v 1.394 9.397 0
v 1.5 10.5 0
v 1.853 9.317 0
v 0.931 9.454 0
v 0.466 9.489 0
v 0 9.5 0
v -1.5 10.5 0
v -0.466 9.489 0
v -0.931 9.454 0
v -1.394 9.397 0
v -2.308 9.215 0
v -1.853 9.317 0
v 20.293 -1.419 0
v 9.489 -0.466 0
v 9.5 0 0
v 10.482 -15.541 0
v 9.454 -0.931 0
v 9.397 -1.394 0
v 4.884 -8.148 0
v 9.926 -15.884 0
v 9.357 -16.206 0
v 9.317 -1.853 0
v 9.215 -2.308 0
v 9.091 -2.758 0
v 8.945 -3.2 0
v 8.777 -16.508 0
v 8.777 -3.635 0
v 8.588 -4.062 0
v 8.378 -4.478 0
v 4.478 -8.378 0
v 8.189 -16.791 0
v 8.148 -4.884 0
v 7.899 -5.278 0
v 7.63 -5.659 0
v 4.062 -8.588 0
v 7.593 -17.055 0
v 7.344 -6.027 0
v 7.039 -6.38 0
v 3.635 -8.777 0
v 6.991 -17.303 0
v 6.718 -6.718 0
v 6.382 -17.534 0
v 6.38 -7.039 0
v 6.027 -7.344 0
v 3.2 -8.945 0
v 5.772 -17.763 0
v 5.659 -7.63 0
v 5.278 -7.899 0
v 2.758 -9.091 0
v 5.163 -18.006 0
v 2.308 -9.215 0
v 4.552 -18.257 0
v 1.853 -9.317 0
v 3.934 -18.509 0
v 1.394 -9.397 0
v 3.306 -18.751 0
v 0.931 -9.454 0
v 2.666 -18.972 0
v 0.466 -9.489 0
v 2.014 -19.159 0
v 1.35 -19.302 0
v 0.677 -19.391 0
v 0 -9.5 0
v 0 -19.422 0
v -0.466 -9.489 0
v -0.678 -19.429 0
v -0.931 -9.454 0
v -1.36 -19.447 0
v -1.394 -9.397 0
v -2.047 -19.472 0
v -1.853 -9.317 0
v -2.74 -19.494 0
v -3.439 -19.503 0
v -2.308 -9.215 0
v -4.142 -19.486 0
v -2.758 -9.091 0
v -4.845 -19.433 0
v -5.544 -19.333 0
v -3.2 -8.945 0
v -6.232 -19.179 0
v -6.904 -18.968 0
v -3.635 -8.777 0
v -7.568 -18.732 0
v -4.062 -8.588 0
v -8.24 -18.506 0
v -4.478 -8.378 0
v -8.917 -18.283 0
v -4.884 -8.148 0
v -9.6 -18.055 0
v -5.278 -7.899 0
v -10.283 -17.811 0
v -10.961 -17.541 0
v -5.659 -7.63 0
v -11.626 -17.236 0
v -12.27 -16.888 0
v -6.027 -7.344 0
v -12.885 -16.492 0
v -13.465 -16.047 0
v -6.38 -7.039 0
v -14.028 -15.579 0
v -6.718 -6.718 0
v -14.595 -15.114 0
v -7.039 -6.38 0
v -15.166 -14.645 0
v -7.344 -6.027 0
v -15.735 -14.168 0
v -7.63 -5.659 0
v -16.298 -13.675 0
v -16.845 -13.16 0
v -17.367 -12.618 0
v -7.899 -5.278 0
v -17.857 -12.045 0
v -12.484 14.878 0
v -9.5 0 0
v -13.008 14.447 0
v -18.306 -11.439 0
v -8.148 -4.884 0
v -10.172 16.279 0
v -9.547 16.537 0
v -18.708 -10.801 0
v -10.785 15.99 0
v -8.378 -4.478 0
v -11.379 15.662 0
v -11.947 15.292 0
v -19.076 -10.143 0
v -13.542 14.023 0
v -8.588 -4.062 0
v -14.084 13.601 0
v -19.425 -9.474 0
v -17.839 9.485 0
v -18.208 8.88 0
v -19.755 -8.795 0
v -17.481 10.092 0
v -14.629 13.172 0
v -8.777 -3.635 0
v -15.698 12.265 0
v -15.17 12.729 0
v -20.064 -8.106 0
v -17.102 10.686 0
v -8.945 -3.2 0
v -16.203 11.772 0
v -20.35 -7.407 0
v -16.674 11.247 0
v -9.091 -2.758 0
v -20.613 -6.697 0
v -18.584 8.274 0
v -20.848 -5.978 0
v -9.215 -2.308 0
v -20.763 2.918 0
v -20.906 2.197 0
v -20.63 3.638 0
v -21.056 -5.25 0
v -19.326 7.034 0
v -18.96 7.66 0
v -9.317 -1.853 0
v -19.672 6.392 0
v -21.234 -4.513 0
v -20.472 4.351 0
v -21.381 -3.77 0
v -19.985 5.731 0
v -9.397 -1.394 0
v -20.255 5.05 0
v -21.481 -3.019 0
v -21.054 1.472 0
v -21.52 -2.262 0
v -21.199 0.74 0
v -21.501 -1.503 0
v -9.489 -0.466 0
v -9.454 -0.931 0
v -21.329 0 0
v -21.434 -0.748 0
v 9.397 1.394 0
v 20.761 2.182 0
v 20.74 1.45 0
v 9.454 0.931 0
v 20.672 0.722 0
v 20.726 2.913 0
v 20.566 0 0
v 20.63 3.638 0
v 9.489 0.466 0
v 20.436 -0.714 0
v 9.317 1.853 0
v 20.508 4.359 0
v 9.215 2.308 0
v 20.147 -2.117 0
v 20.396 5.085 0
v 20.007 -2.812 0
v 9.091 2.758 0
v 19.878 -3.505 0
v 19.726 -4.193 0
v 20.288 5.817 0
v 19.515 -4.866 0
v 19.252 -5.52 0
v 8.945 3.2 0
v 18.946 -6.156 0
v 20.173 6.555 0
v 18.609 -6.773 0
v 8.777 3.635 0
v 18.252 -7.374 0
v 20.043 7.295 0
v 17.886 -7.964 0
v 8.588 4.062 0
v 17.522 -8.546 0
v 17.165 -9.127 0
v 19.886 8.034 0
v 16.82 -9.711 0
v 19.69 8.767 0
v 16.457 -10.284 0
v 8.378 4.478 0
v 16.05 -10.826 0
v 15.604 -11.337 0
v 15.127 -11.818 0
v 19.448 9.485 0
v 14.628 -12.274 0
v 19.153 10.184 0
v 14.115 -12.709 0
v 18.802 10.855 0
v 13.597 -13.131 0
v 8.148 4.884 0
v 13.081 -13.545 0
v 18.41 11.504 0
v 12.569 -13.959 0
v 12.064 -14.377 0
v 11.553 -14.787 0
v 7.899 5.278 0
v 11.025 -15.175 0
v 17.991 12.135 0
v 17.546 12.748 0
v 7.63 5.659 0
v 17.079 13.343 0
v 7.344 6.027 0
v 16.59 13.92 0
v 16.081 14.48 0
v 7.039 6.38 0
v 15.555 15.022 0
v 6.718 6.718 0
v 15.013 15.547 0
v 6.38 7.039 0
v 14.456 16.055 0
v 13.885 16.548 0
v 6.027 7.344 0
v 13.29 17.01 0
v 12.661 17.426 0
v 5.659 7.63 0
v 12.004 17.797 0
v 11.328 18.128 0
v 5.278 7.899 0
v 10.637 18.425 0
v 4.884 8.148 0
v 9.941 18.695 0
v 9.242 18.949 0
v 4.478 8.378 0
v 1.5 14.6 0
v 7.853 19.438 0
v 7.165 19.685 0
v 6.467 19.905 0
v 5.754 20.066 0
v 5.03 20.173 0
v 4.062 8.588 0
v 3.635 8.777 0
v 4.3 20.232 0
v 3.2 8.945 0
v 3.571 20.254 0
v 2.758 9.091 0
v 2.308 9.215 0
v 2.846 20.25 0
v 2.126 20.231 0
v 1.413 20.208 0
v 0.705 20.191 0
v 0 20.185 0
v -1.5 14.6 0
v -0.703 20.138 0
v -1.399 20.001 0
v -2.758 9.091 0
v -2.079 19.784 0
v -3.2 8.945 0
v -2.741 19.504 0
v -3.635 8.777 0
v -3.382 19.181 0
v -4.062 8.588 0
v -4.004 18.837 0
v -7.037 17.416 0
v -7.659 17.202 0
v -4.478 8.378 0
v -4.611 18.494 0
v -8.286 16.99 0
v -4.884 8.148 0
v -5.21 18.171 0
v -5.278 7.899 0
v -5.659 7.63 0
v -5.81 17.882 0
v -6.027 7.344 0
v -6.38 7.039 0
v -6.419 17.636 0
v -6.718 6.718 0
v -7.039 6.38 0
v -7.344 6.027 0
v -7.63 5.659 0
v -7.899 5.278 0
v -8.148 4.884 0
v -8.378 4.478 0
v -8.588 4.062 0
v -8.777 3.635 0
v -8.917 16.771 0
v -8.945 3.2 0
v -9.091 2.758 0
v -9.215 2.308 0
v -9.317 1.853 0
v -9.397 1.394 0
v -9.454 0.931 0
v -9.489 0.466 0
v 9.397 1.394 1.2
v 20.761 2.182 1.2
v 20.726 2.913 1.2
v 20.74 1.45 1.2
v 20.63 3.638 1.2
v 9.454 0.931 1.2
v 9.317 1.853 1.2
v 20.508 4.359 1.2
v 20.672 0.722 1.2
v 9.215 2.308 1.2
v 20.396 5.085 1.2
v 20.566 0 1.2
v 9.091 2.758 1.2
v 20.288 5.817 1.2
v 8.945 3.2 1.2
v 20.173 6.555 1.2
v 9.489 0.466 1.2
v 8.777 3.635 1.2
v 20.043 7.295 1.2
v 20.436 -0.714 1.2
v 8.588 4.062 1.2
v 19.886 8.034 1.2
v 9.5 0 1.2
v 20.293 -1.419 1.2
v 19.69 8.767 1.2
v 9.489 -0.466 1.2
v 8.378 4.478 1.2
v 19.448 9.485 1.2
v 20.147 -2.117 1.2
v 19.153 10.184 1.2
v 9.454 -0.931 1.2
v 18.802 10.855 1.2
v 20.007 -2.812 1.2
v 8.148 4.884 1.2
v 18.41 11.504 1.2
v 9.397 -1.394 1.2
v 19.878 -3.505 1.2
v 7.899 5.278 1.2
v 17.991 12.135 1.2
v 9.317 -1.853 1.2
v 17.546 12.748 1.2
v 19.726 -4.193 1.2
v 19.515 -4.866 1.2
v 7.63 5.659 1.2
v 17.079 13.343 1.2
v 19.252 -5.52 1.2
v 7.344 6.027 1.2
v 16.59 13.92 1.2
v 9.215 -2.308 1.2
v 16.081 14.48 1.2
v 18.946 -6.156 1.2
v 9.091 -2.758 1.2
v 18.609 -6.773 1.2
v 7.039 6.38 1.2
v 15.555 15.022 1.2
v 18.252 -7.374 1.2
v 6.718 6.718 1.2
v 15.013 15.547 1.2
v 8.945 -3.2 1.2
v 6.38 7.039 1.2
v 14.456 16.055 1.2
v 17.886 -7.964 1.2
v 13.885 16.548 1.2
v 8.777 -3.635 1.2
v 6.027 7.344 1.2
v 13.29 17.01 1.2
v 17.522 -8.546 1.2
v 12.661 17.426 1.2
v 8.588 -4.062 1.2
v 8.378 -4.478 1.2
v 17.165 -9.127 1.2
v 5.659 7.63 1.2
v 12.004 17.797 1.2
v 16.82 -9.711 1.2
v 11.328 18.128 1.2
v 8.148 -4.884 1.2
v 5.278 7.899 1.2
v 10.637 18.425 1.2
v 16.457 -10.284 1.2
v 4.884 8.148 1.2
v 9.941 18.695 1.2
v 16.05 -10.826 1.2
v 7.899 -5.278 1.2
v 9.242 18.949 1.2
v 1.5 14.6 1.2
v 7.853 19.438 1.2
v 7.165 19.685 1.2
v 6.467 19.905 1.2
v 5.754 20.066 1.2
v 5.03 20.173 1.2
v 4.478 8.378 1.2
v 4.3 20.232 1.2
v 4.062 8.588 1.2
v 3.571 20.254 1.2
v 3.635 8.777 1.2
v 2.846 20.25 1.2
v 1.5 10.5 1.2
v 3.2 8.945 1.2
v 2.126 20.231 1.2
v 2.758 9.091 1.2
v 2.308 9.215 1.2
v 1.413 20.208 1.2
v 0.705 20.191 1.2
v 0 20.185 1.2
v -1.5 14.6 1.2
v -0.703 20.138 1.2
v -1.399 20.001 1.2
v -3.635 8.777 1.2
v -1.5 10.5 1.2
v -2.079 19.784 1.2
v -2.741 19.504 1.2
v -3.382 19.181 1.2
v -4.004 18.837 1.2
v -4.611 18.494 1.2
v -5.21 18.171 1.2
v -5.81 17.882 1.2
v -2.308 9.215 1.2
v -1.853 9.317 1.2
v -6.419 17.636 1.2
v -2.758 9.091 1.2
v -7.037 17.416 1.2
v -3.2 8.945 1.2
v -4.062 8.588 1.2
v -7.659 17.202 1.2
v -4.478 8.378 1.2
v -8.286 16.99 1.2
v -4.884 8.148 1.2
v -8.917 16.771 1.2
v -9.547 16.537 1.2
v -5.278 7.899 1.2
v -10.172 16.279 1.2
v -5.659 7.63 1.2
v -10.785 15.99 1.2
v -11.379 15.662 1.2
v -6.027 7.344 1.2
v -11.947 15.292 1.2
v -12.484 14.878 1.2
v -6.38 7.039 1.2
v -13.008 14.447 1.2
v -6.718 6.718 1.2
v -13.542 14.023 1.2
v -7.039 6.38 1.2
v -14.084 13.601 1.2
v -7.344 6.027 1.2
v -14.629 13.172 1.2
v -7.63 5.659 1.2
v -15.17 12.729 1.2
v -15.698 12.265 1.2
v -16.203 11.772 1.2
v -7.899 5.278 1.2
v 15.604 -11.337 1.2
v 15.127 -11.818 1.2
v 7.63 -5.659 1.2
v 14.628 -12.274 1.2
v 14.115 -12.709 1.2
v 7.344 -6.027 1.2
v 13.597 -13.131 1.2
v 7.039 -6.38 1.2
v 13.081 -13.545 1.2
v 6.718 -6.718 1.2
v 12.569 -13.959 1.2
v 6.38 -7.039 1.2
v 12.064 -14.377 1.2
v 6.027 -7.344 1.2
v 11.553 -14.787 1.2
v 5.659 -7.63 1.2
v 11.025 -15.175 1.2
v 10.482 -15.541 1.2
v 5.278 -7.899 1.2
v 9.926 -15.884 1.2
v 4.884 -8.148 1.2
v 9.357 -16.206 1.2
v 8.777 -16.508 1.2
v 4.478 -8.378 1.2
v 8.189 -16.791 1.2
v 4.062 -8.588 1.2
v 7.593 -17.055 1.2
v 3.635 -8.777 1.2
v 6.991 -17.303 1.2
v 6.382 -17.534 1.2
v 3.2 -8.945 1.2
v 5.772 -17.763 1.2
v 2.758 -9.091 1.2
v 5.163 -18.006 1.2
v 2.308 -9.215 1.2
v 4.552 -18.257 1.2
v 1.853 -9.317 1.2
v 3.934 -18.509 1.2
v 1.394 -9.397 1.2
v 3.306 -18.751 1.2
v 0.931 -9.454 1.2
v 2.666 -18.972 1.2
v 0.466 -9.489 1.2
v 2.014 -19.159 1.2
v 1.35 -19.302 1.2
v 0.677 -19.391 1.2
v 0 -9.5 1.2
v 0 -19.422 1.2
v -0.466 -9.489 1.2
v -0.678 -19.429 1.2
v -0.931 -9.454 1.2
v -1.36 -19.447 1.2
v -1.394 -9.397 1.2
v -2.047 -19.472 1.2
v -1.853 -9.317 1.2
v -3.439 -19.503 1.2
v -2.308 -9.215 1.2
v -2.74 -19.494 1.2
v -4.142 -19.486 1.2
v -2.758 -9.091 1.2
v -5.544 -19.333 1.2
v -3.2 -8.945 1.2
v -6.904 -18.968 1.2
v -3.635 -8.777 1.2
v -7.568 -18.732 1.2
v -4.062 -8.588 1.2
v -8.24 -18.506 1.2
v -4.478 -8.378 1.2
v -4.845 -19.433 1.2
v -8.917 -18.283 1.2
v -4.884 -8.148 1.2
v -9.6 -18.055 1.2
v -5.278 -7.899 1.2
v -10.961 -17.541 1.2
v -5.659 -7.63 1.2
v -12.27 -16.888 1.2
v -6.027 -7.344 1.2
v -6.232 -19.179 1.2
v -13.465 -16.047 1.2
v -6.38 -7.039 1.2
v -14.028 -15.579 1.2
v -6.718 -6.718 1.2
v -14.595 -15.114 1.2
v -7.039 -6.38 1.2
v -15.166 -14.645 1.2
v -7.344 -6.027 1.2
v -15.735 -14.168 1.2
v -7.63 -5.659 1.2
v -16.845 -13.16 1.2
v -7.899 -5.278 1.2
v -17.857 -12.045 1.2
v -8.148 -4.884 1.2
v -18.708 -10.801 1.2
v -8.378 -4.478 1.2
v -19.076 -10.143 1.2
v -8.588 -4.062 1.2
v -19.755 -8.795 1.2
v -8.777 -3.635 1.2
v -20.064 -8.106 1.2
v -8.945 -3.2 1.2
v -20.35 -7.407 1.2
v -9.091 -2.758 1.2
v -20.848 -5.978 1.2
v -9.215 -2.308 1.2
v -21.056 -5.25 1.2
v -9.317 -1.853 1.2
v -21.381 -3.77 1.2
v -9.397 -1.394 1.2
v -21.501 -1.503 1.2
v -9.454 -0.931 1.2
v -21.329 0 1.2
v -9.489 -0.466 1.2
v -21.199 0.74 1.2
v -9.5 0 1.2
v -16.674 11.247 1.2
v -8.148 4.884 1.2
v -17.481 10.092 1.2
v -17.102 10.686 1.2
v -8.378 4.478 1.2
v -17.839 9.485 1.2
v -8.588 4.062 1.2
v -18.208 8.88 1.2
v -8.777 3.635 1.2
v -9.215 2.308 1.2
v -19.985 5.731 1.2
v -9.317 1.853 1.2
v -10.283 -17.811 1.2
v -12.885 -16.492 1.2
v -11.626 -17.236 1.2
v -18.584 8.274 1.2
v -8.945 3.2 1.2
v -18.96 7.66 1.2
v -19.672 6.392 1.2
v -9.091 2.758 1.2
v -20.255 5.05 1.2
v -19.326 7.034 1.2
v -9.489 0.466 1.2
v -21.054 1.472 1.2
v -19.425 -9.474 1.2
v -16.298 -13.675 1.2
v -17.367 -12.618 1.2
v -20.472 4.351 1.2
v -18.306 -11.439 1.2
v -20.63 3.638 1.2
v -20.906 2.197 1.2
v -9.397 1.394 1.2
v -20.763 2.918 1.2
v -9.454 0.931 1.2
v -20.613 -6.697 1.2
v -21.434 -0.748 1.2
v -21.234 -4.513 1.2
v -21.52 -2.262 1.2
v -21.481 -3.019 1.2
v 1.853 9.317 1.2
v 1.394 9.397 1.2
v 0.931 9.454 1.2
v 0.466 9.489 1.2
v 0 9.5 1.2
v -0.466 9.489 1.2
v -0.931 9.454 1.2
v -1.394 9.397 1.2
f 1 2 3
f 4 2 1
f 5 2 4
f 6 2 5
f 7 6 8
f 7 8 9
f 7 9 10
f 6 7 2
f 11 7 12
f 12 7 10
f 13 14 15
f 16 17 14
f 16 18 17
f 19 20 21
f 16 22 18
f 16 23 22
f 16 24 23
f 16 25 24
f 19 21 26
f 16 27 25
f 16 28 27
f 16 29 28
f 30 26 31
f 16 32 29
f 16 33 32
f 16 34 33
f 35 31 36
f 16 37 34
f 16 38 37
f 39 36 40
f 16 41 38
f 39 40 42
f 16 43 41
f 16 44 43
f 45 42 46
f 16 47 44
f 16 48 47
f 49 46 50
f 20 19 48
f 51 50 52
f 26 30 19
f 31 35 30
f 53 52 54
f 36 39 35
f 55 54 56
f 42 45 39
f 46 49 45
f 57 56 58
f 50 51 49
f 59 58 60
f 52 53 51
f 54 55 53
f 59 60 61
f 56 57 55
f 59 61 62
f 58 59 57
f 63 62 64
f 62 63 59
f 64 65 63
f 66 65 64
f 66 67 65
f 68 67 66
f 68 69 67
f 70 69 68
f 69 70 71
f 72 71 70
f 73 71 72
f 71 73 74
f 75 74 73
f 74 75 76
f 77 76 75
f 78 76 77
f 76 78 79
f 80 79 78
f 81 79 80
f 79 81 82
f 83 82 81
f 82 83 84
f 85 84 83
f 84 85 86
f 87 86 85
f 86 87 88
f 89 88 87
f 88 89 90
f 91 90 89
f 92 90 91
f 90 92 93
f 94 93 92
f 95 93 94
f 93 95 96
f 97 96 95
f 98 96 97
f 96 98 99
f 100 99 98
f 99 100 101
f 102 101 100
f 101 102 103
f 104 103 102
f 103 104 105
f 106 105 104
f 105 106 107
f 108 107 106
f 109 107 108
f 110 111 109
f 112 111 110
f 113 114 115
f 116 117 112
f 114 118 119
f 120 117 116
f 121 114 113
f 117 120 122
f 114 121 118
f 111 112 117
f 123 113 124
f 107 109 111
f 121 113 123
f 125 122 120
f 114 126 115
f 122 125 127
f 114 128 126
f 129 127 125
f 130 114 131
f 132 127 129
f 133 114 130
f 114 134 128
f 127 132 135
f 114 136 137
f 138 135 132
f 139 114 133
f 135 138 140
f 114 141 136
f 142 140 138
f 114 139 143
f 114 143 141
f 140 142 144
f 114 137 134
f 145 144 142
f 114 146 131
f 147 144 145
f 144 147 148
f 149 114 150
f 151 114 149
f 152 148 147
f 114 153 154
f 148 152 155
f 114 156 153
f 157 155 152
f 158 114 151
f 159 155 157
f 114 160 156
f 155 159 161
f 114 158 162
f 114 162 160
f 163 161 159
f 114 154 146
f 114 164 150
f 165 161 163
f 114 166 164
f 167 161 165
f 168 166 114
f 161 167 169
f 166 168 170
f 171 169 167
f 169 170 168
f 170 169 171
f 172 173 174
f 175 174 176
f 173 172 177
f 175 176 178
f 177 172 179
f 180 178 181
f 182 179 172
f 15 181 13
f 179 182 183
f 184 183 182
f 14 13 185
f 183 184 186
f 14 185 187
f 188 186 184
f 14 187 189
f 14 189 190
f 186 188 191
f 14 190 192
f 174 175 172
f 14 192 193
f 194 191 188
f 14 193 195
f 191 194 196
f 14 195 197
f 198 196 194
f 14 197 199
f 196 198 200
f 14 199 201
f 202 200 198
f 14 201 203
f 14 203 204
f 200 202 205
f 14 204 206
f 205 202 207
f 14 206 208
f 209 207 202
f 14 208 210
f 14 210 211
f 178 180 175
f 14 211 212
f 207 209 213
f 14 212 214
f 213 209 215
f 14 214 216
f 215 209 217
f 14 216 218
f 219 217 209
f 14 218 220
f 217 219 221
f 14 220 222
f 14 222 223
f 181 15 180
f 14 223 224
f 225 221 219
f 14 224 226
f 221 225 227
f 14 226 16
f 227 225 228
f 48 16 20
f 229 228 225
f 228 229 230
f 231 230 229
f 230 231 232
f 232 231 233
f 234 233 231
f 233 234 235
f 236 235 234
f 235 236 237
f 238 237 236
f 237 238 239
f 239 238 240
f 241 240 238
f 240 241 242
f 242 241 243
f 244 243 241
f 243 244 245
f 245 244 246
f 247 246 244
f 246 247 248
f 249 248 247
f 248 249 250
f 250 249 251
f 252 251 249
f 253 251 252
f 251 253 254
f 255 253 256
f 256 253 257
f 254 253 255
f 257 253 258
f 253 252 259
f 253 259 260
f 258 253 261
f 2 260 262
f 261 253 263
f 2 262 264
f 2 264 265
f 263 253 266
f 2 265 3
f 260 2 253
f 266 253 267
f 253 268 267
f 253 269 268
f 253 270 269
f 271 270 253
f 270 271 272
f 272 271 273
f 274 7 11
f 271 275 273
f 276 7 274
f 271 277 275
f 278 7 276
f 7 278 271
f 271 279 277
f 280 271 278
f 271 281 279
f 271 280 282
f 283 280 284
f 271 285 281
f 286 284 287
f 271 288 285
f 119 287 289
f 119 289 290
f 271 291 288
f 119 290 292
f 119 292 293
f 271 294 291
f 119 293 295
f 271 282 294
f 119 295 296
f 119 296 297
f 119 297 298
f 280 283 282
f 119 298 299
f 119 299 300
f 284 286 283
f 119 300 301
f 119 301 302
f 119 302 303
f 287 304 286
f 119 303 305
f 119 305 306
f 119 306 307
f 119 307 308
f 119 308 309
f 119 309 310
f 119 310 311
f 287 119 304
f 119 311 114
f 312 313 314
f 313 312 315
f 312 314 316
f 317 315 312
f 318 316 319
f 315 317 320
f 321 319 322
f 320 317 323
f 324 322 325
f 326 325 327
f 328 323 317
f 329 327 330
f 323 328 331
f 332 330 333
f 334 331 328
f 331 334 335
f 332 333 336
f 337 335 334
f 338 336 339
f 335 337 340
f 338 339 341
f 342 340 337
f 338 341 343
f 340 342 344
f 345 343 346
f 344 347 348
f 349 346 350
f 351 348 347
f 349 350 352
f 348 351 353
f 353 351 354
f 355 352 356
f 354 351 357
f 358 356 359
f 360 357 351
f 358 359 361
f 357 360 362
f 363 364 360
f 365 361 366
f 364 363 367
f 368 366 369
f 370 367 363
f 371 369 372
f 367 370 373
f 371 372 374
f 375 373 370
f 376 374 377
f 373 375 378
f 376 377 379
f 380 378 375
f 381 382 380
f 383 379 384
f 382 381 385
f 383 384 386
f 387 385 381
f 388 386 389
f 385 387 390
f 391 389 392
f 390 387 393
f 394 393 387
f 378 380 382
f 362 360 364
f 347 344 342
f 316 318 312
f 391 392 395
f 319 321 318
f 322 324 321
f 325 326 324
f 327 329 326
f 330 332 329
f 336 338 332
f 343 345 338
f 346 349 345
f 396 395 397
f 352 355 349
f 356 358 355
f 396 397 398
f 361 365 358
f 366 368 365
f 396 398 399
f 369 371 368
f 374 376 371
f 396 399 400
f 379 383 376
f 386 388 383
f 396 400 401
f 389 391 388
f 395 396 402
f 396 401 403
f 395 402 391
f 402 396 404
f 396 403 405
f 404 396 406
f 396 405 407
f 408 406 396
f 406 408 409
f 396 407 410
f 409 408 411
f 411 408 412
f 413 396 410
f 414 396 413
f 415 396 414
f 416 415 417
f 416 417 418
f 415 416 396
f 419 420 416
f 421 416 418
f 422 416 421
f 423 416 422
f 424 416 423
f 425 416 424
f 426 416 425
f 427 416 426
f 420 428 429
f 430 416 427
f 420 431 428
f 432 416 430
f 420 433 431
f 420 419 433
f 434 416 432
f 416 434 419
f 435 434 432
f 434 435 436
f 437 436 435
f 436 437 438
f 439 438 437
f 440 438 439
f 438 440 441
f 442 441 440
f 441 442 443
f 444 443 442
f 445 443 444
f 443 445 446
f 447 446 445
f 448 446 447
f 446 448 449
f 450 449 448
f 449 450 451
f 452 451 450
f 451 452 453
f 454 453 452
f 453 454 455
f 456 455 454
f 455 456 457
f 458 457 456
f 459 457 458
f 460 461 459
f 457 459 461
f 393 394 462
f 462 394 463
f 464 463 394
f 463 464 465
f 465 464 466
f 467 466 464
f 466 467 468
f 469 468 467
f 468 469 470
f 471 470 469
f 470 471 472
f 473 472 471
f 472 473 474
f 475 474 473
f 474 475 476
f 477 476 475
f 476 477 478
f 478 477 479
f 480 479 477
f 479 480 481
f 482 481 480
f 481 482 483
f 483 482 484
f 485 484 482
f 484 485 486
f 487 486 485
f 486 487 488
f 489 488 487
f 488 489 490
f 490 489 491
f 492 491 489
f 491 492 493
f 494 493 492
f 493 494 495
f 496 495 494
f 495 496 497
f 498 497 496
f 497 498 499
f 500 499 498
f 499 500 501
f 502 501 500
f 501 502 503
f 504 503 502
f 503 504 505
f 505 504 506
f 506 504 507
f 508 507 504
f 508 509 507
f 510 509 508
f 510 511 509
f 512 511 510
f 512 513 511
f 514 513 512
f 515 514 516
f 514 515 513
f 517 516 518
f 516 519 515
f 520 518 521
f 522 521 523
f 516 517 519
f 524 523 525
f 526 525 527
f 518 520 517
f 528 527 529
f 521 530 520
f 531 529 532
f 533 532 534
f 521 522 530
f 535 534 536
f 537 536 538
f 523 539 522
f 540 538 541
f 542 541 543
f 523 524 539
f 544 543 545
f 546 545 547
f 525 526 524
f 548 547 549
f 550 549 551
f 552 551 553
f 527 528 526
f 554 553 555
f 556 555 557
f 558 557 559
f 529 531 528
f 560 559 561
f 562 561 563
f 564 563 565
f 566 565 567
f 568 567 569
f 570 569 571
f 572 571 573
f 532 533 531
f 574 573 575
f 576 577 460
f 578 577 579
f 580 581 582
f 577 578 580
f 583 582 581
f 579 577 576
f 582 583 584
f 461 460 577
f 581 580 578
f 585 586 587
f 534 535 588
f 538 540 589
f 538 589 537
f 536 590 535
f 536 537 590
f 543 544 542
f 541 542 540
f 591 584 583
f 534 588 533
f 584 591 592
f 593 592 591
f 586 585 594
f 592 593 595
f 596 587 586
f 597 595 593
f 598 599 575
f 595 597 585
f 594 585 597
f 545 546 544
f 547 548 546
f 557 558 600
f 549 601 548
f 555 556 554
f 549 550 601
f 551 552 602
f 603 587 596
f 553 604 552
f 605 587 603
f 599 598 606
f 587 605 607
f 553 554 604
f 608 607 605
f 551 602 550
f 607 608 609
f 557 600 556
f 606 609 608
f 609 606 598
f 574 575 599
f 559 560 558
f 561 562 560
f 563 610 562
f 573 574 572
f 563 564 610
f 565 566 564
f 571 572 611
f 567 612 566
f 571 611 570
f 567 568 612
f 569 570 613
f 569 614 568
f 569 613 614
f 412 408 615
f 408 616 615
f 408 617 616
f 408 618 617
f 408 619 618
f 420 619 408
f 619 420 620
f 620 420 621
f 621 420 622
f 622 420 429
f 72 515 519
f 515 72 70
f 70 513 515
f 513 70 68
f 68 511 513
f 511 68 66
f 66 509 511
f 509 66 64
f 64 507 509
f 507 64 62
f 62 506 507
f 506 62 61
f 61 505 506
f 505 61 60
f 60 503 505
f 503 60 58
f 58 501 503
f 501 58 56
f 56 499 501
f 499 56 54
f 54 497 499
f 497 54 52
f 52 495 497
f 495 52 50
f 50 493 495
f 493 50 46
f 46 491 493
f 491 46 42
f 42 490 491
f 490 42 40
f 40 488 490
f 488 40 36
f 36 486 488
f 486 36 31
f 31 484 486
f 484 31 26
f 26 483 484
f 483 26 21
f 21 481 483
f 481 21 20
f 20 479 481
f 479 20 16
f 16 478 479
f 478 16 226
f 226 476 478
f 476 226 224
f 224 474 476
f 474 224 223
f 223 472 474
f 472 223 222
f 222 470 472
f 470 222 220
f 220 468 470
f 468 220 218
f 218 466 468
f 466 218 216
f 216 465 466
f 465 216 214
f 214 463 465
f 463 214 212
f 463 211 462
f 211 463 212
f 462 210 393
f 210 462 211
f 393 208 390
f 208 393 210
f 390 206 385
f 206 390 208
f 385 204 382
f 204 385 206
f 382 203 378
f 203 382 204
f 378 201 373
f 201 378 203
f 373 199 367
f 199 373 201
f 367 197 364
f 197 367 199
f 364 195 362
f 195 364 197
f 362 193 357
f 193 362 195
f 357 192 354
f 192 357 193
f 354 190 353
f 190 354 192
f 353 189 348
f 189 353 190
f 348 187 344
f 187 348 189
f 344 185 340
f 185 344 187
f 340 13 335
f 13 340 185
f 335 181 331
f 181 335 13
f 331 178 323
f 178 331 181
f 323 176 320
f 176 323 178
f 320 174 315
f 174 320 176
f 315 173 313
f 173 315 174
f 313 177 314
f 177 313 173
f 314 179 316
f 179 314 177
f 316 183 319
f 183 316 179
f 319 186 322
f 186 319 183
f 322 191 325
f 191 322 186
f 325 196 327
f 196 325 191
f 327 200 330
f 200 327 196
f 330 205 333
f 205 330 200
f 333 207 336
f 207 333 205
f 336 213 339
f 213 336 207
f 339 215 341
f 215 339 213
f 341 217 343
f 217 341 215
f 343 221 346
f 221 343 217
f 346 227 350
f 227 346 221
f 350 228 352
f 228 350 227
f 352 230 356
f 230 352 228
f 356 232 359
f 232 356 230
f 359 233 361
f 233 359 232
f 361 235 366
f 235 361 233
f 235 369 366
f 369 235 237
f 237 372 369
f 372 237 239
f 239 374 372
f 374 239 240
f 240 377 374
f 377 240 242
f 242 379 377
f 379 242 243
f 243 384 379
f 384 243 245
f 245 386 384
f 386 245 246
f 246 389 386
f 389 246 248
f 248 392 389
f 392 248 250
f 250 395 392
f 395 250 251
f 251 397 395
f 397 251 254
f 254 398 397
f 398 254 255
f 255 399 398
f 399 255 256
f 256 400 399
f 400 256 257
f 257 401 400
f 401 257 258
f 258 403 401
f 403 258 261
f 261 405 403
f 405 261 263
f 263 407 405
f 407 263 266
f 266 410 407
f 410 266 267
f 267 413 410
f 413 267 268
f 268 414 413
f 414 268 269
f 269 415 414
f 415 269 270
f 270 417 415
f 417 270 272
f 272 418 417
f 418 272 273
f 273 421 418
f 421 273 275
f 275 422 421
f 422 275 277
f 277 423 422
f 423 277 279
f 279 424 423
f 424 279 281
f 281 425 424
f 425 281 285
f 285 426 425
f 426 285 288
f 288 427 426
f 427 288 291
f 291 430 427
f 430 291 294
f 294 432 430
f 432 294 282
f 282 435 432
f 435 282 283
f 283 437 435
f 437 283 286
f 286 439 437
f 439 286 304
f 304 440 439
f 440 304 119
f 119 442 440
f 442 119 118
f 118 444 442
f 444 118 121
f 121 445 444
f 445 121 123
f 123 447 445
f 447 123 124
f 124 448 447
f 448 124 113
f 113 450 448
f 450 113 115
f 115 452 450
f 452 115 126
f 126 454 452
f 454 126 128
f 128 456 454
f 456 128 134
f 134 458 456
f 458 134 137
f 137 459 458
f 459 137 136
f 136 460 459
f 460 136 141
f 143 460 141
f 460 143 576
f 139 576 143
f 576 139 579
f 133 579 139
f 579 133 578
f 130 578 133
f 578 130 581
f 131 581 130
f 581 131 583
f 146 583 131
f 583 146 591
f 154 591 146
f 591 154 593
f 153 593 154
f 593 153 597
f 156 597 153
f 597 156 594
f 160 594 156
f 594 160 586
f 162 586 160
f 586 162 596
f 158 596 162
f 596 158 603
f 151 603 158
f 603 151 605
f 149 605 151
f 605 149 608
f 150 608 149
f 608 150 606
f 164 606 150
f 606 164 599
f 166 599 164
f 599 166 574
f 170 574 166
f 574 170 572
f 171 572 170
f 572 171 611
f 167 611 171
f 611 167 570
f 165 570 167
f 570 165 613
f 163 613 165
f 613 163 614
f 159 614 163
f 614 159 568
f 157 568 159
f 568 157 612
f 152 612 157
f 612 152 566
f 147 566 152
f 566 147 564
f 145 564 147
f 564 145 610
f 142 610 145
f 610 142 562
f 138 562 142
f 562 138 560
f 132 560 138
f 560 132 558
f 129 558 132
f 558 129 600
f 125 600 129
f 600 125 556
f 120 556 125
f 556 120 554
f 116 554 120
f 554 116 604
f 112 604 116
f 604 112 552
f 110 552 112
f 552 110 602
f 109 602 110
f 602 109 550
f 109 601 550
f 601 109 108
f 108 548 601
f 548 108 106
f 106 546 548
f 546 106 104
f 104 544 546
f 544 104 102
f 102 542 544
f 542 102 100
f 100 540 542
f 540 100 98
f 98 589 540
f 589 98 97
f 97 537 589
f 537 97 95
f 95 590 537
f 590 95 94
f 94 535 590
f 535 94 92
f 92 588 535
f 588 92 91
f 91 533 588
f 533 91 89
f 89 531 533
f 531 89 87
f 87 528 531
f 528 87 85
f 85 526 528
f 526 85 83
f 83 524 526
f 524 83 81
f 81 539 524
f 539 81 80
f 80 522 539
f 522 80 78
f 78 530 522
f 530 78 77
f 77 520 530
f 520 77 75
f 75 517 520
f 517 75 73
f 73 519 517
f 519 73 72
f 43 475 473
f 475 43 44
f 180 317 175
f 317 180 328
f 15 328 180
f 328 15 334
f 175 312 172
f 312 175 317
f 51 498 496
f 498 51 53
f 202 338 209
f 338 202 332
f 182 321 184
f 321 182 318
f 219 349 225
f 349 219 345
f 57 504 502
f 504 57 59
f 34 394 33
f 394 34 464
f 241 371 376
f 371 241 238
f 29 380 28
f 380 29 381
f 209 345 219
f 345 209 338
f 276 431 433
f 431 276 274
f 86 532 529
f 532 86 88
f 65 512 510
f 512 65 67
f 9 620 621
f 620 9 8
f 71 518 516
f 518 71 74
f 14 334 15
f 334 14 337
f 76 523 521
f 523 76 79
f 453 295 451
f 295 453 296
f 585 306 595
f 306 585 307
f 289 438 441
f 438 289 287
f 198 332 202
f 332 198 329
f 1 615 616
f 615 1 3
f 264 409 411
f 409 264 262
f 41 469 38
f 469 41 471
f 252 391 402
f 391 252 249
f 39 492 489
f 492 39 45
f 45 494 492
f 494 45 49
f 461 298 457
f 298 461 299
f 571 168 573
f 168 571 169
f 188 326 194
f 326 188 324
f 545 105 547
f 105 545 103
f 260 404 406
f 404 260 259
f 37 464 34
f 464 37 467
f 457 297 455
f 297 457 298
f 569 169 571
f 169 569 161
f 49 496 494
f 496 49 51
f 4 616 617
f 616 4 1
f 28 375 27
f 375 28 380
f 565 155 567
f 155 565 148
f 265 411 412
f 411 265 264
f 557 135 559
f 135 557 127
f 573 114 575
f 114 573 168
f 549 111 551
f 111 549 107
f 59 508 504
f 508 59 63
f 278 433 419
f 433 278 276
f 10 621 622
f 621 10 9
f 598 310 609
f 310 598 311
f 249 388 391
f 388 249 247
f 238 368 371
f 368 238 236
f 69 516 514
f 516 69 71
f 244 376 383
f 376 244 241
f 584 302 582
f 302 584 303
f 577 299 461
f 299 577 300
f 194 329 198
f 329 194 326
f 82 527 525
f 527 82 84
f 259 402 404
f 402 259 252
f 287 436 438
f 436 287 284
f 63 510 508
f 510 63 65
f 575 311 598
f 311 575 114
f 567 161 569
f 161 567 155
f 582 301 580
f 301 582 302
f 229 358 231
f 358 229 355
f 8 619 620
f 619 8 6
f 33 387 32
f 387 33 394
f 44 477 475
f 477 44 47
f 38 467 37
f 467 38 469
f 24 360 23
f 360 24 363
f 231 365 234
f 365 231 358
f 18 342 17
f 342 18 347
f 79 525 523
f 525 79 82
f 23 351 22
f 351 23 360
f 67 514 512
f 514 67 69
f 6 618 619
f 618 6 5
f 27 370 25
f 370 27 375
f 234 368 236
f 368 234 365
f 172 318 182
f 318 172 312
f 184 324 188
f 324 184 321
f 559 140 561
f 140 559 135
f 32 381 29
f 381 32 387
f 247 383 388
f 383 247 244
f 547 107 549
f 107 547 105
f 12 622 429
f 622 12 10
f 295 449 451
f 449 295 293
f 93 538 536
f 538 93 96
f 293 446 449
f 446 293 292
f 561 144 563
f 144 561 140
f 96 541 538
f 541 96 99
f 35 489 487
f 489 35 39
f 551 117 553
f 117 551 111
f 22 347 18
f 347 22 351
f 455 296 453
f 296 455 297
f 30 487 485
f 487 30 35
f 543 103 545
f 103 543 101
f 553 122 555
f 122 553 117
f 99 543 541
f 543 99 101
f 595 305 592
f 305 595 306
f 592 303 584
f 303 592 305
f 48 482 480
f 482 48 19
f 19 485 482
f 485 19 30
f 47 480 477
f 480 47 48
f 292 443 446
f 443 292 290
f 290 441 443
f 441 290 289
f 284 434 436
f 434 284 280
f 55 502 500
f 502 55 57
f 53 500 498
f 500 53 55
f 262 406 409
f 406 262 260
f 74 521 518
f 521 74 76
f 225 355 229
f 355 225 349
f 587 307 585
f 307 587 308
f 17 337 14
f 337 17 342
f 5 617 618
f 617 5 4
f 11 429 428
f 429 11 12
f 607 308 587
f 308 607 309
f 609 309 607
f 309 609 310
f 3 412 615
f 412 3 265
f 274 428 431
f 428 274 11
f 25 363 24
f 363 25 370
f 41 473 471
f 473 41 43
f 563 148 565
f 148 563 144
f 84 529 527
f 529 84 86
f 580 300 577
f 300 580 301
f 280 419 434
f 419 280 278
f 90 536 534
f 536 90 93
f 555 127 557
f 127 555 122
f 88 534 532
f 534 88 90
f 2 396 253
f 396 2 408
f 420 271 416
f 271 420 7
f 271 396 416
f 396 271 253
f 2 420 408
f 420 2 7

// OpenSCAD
/*
  Elna Supermatic cam 02
  Name: Serpentine
  Status: candidate

  Generated from measured parametric base v2.
  Surface mode: smooth
*/

include <_elna_measured_common.scad>;

profile_points = [
        [0.0000, 20.1850],
        [0.7051, 20.1914],
        [1.4131, 20.2085],
        [2.1263, 20.2308],
        [2.8459, 20.2496],
        [3.5713, 20.2540],
        [4.3005, 20.2324],
        [5.0297, 20.1732],
        [5.7540, 20.0665],
        [6.4675, 19.9050],
        [7.1646, 19.6847],
        [7.8533, 19.4375],
        [8.5457, 19.1940],
        [9.2421, 18.9491],
        [9.9406, 18.6955],
        [10.6375, 18.4247],
        [11.3276, 18.1279],
        [12.0043, 17.7971],
        [12.6606, 17.4259],
        [13.2897, 17.0100],
        [13.8855, 16.5481],
        [14.4563, 16.0554],
        [15.0132, 15.5467],
        [15.5553, 15.0216],
        [16.0814, 14.4798],
        [16.5898, 13.9205],
        [17.0788, 13.3434],
        [17.5464, 12.7482],
        [17.9906, 12.1348],
        [18.4097, 11.5037],
        [18.8023, 10.8555],
        [19.1532, 10.1839],
        [19.4482, 9.4855],
        [19.6903, 8.7667],
        [19.8857, 8.0343],
        [20.0432, 7.2951],
        [20.1734, 6.5547],
        [20.2877, 5.8174],
        [20.3965, 5.0854],
        [20.5085, 4.3592],
        [20.6298, 3.6376],
        [20.7256, 2.9128],
        [20.7608, 2.1820],
        [20.7401, 1.4503],
        [20.6718, 0.7219],
        [20.5665, 0.0000],
        [20.4362, -0.7136],
        [20.2927, -1.4190],
        [20.1469, -2.1175],
        [20.0071, -2.8118],
        [19.8783, -3.5051],
        [19.7256, -4.1928],
        [19.5147, -4.8656],
        [19.2519, -5.5204],
        [18.9464, -6.1560],
        [18.6092, -6.7732],
        [18.2522, -7.3744],
        [17.8865, -7.9636],
        [17.5219, -8.5460],
        [17.1651, -9.1268],
        [16.8199, -9.7110],
        [16.4572, -10.2836],
        [16.0498, -10.8257],
        [15.6037, -11.3367],
        [15.1267, -11.8183],
        [14.6276, -12.2740],
        [14.1153, -12.7094],
        [13.5975, -13.1310],
        [13.0807, -13.5455],
        [12.5690, -13.9592],
        [12.0638, -14.3771],
        [11.5531, -14.7873],
        [11.0254, -15.1752],
        [10.4824, -15.5408],
        [9.9256, -15.8842],
        [9.3567, -16.2064],
        [8.7775, -16.5082],
        [8.1894, -16.7908],
        [7.5935, -17.0554],
        [6.9908, -17.3028],
        [6.3818, -17.5337],
        [5.7717, -17.7635],
        [5.1632, -18.0062],
        [4.5521, -18.2573],
        [3.9342, -18.5091],
        [3.3063, -18.7512],
        [2.6663, -18.9719],
        [2.0137, -19.1592],
        [1.3497, -19.3020],
        [0.6772, -19.3915],
        [0.0000, -19.4220],
        [-0.6785, -19.4288],
        [-1.3599, -19.4474],
        [-2.0466, -19.4720],
        [-2.7397, -19.4940],
        [-3.4388, -19.5026],
        [-4.1419, -19.4861],
        [-4.8451, -19.4328],
        [-5.5437, -19.3330],
        [-6.2317, -19.1793],
        [-6.9037, -18.9677],
        [-7.5684, -18.7325],
        [-8.2396, -18.5065],
        [-8.9175, -18.2835],
        [-9.6000, -18.0551],
        [-10.2833, -17.8111],
        [-10.9611, -17.5414],
        [-11.6260, -17.2363],
        [-12.2701, -16.8883],
        [-12.8854, -16.4925],
        [-13.4651, -16.0471],
        [-14.0277, -15.5793],
        [-14.5951, -15.1137],
        [-15.1657, -14.6453],
        [-15.7353, -14.1681],
        [-16.2976, -13.6753],
        [-16.8446, -13.1604],
        [-17.3673, -12.6181],
        [-17.8571, -12.0448],
        [-18.3060, -11.4388],
        [-18.7079, -10.8010],
        [-19.0758, -10.1428],
        [-19.4251, -9.4743],
        [-19.7549, -8.7955],
        [-20.0639, -8.1064],
        [-20.3505, -7.4070],
        [-20.6126, -6.6974],
        [-20.8484, -5.9782],
        [-21.0560, -5.2498],
        [-21.2340, -4.5134],
        [-21.3812, -3.7701],
        [-21.4812, -3.0190],
        [-21.5196, -2.2618],
        [-21.5012, -1.5035],
        [-21.4343, -0.7485],
        [-21.3295, -0.0000],
        [-21.1987, 0.7403],
        [-21.0538, 1.4722],
        [-20.9057, 2.1973],
        [-20.7626, 2.9180],
        [-20.6298, 3.6376],
        [-20.4720, 4.3515],
        [-20.2551, 5.0502],
        [-19.9853, 5.7307],
        [-19.6720, 6.3918],
        [-19.3262, 7.0342],
        [-18.9596, 7.6602],
        [-18.5836, 8.2739],
        [-18.2076, 8.8805],
        [-17.8388, 9.4850],
        [-17.4807, 10.0925],
        [-17.1020, 10.6865],
        [-16.6737, 11.2466],
        [-16.2028, 11.7720],
        [-15.6983, 12.2648],
        [-15.1704, 12.7294],
        [-14.6293, 13.1722],
        [-14.0841, 13.6009],
        [-13.5423, 14.0234],
        [-13.0083, 14.4472],
        [-12.4842, 14.8781],
        [-11.9475, 15.2921],
        [-11.3793, 15.6622],
        [-10.7853, 15.9898],
        [-10.1724, 16.2792],
        [-9.5475, 16.5368],
        [-8.9171, 16.7707],
        [-8.2864, 16.9897],
        [-7.6590, 17.2025],
        [-7.0366, 17.4162],
        [-6.4190, 17.6362],
        [-5.8103, 17.8824],
        [-5.2105, 18.1710],
        [-4.6110, 18.4939],
        [-4.0039, 18.8367],
        [-3.3821, 19.1806],
        [-2.7411, 19.5038],
        [-2.0794, 19.7840],
        [-1.3986, 20.0008],
        [-0.7032, 20.1380]
];

icon_points = [[-1.000,0.500], [-0.956,0.599], [-0.911,0.691], [-0.867,0.768], [-0.822,0.824], [-0.778,0.855], [-0.733,0.858], [-0.689,0.834], [-0.644,0.784], [-0.600,0.712], [-0.556,0.623], [-0.511,0.525], [-0.467,0.425], [-0.422,0.331], [-0.378,0.250], [-0.333,0.188], [-0.289,0.151], [-0.244,0.140], [-0.200,0.158], [-0.156,0.202], [-0.111,0.269], [-0.067,0.354], [-0.022,0.450], [0.022,0.550], [0.067,0.646], [0.111,0.731], [0.156,0.798], [0.200,0.842], [0.244,0.860], [0.289,0.849], [0.333,0.812], [0.378,0.750], [0.422,0.669], [0.467,0.575], [0.511,0.475], [0.556,0.377], [0.600,0.288], [0.644,0.216], [0.689,0.166], [0.733,0.142], [0.778,0.145], [0.822,0.176], [0.867,0.232], [0.911,0.309], [0.956,0.401], [1.000,0.500]];

elna_cam_ring(profile_points=profile_points);
